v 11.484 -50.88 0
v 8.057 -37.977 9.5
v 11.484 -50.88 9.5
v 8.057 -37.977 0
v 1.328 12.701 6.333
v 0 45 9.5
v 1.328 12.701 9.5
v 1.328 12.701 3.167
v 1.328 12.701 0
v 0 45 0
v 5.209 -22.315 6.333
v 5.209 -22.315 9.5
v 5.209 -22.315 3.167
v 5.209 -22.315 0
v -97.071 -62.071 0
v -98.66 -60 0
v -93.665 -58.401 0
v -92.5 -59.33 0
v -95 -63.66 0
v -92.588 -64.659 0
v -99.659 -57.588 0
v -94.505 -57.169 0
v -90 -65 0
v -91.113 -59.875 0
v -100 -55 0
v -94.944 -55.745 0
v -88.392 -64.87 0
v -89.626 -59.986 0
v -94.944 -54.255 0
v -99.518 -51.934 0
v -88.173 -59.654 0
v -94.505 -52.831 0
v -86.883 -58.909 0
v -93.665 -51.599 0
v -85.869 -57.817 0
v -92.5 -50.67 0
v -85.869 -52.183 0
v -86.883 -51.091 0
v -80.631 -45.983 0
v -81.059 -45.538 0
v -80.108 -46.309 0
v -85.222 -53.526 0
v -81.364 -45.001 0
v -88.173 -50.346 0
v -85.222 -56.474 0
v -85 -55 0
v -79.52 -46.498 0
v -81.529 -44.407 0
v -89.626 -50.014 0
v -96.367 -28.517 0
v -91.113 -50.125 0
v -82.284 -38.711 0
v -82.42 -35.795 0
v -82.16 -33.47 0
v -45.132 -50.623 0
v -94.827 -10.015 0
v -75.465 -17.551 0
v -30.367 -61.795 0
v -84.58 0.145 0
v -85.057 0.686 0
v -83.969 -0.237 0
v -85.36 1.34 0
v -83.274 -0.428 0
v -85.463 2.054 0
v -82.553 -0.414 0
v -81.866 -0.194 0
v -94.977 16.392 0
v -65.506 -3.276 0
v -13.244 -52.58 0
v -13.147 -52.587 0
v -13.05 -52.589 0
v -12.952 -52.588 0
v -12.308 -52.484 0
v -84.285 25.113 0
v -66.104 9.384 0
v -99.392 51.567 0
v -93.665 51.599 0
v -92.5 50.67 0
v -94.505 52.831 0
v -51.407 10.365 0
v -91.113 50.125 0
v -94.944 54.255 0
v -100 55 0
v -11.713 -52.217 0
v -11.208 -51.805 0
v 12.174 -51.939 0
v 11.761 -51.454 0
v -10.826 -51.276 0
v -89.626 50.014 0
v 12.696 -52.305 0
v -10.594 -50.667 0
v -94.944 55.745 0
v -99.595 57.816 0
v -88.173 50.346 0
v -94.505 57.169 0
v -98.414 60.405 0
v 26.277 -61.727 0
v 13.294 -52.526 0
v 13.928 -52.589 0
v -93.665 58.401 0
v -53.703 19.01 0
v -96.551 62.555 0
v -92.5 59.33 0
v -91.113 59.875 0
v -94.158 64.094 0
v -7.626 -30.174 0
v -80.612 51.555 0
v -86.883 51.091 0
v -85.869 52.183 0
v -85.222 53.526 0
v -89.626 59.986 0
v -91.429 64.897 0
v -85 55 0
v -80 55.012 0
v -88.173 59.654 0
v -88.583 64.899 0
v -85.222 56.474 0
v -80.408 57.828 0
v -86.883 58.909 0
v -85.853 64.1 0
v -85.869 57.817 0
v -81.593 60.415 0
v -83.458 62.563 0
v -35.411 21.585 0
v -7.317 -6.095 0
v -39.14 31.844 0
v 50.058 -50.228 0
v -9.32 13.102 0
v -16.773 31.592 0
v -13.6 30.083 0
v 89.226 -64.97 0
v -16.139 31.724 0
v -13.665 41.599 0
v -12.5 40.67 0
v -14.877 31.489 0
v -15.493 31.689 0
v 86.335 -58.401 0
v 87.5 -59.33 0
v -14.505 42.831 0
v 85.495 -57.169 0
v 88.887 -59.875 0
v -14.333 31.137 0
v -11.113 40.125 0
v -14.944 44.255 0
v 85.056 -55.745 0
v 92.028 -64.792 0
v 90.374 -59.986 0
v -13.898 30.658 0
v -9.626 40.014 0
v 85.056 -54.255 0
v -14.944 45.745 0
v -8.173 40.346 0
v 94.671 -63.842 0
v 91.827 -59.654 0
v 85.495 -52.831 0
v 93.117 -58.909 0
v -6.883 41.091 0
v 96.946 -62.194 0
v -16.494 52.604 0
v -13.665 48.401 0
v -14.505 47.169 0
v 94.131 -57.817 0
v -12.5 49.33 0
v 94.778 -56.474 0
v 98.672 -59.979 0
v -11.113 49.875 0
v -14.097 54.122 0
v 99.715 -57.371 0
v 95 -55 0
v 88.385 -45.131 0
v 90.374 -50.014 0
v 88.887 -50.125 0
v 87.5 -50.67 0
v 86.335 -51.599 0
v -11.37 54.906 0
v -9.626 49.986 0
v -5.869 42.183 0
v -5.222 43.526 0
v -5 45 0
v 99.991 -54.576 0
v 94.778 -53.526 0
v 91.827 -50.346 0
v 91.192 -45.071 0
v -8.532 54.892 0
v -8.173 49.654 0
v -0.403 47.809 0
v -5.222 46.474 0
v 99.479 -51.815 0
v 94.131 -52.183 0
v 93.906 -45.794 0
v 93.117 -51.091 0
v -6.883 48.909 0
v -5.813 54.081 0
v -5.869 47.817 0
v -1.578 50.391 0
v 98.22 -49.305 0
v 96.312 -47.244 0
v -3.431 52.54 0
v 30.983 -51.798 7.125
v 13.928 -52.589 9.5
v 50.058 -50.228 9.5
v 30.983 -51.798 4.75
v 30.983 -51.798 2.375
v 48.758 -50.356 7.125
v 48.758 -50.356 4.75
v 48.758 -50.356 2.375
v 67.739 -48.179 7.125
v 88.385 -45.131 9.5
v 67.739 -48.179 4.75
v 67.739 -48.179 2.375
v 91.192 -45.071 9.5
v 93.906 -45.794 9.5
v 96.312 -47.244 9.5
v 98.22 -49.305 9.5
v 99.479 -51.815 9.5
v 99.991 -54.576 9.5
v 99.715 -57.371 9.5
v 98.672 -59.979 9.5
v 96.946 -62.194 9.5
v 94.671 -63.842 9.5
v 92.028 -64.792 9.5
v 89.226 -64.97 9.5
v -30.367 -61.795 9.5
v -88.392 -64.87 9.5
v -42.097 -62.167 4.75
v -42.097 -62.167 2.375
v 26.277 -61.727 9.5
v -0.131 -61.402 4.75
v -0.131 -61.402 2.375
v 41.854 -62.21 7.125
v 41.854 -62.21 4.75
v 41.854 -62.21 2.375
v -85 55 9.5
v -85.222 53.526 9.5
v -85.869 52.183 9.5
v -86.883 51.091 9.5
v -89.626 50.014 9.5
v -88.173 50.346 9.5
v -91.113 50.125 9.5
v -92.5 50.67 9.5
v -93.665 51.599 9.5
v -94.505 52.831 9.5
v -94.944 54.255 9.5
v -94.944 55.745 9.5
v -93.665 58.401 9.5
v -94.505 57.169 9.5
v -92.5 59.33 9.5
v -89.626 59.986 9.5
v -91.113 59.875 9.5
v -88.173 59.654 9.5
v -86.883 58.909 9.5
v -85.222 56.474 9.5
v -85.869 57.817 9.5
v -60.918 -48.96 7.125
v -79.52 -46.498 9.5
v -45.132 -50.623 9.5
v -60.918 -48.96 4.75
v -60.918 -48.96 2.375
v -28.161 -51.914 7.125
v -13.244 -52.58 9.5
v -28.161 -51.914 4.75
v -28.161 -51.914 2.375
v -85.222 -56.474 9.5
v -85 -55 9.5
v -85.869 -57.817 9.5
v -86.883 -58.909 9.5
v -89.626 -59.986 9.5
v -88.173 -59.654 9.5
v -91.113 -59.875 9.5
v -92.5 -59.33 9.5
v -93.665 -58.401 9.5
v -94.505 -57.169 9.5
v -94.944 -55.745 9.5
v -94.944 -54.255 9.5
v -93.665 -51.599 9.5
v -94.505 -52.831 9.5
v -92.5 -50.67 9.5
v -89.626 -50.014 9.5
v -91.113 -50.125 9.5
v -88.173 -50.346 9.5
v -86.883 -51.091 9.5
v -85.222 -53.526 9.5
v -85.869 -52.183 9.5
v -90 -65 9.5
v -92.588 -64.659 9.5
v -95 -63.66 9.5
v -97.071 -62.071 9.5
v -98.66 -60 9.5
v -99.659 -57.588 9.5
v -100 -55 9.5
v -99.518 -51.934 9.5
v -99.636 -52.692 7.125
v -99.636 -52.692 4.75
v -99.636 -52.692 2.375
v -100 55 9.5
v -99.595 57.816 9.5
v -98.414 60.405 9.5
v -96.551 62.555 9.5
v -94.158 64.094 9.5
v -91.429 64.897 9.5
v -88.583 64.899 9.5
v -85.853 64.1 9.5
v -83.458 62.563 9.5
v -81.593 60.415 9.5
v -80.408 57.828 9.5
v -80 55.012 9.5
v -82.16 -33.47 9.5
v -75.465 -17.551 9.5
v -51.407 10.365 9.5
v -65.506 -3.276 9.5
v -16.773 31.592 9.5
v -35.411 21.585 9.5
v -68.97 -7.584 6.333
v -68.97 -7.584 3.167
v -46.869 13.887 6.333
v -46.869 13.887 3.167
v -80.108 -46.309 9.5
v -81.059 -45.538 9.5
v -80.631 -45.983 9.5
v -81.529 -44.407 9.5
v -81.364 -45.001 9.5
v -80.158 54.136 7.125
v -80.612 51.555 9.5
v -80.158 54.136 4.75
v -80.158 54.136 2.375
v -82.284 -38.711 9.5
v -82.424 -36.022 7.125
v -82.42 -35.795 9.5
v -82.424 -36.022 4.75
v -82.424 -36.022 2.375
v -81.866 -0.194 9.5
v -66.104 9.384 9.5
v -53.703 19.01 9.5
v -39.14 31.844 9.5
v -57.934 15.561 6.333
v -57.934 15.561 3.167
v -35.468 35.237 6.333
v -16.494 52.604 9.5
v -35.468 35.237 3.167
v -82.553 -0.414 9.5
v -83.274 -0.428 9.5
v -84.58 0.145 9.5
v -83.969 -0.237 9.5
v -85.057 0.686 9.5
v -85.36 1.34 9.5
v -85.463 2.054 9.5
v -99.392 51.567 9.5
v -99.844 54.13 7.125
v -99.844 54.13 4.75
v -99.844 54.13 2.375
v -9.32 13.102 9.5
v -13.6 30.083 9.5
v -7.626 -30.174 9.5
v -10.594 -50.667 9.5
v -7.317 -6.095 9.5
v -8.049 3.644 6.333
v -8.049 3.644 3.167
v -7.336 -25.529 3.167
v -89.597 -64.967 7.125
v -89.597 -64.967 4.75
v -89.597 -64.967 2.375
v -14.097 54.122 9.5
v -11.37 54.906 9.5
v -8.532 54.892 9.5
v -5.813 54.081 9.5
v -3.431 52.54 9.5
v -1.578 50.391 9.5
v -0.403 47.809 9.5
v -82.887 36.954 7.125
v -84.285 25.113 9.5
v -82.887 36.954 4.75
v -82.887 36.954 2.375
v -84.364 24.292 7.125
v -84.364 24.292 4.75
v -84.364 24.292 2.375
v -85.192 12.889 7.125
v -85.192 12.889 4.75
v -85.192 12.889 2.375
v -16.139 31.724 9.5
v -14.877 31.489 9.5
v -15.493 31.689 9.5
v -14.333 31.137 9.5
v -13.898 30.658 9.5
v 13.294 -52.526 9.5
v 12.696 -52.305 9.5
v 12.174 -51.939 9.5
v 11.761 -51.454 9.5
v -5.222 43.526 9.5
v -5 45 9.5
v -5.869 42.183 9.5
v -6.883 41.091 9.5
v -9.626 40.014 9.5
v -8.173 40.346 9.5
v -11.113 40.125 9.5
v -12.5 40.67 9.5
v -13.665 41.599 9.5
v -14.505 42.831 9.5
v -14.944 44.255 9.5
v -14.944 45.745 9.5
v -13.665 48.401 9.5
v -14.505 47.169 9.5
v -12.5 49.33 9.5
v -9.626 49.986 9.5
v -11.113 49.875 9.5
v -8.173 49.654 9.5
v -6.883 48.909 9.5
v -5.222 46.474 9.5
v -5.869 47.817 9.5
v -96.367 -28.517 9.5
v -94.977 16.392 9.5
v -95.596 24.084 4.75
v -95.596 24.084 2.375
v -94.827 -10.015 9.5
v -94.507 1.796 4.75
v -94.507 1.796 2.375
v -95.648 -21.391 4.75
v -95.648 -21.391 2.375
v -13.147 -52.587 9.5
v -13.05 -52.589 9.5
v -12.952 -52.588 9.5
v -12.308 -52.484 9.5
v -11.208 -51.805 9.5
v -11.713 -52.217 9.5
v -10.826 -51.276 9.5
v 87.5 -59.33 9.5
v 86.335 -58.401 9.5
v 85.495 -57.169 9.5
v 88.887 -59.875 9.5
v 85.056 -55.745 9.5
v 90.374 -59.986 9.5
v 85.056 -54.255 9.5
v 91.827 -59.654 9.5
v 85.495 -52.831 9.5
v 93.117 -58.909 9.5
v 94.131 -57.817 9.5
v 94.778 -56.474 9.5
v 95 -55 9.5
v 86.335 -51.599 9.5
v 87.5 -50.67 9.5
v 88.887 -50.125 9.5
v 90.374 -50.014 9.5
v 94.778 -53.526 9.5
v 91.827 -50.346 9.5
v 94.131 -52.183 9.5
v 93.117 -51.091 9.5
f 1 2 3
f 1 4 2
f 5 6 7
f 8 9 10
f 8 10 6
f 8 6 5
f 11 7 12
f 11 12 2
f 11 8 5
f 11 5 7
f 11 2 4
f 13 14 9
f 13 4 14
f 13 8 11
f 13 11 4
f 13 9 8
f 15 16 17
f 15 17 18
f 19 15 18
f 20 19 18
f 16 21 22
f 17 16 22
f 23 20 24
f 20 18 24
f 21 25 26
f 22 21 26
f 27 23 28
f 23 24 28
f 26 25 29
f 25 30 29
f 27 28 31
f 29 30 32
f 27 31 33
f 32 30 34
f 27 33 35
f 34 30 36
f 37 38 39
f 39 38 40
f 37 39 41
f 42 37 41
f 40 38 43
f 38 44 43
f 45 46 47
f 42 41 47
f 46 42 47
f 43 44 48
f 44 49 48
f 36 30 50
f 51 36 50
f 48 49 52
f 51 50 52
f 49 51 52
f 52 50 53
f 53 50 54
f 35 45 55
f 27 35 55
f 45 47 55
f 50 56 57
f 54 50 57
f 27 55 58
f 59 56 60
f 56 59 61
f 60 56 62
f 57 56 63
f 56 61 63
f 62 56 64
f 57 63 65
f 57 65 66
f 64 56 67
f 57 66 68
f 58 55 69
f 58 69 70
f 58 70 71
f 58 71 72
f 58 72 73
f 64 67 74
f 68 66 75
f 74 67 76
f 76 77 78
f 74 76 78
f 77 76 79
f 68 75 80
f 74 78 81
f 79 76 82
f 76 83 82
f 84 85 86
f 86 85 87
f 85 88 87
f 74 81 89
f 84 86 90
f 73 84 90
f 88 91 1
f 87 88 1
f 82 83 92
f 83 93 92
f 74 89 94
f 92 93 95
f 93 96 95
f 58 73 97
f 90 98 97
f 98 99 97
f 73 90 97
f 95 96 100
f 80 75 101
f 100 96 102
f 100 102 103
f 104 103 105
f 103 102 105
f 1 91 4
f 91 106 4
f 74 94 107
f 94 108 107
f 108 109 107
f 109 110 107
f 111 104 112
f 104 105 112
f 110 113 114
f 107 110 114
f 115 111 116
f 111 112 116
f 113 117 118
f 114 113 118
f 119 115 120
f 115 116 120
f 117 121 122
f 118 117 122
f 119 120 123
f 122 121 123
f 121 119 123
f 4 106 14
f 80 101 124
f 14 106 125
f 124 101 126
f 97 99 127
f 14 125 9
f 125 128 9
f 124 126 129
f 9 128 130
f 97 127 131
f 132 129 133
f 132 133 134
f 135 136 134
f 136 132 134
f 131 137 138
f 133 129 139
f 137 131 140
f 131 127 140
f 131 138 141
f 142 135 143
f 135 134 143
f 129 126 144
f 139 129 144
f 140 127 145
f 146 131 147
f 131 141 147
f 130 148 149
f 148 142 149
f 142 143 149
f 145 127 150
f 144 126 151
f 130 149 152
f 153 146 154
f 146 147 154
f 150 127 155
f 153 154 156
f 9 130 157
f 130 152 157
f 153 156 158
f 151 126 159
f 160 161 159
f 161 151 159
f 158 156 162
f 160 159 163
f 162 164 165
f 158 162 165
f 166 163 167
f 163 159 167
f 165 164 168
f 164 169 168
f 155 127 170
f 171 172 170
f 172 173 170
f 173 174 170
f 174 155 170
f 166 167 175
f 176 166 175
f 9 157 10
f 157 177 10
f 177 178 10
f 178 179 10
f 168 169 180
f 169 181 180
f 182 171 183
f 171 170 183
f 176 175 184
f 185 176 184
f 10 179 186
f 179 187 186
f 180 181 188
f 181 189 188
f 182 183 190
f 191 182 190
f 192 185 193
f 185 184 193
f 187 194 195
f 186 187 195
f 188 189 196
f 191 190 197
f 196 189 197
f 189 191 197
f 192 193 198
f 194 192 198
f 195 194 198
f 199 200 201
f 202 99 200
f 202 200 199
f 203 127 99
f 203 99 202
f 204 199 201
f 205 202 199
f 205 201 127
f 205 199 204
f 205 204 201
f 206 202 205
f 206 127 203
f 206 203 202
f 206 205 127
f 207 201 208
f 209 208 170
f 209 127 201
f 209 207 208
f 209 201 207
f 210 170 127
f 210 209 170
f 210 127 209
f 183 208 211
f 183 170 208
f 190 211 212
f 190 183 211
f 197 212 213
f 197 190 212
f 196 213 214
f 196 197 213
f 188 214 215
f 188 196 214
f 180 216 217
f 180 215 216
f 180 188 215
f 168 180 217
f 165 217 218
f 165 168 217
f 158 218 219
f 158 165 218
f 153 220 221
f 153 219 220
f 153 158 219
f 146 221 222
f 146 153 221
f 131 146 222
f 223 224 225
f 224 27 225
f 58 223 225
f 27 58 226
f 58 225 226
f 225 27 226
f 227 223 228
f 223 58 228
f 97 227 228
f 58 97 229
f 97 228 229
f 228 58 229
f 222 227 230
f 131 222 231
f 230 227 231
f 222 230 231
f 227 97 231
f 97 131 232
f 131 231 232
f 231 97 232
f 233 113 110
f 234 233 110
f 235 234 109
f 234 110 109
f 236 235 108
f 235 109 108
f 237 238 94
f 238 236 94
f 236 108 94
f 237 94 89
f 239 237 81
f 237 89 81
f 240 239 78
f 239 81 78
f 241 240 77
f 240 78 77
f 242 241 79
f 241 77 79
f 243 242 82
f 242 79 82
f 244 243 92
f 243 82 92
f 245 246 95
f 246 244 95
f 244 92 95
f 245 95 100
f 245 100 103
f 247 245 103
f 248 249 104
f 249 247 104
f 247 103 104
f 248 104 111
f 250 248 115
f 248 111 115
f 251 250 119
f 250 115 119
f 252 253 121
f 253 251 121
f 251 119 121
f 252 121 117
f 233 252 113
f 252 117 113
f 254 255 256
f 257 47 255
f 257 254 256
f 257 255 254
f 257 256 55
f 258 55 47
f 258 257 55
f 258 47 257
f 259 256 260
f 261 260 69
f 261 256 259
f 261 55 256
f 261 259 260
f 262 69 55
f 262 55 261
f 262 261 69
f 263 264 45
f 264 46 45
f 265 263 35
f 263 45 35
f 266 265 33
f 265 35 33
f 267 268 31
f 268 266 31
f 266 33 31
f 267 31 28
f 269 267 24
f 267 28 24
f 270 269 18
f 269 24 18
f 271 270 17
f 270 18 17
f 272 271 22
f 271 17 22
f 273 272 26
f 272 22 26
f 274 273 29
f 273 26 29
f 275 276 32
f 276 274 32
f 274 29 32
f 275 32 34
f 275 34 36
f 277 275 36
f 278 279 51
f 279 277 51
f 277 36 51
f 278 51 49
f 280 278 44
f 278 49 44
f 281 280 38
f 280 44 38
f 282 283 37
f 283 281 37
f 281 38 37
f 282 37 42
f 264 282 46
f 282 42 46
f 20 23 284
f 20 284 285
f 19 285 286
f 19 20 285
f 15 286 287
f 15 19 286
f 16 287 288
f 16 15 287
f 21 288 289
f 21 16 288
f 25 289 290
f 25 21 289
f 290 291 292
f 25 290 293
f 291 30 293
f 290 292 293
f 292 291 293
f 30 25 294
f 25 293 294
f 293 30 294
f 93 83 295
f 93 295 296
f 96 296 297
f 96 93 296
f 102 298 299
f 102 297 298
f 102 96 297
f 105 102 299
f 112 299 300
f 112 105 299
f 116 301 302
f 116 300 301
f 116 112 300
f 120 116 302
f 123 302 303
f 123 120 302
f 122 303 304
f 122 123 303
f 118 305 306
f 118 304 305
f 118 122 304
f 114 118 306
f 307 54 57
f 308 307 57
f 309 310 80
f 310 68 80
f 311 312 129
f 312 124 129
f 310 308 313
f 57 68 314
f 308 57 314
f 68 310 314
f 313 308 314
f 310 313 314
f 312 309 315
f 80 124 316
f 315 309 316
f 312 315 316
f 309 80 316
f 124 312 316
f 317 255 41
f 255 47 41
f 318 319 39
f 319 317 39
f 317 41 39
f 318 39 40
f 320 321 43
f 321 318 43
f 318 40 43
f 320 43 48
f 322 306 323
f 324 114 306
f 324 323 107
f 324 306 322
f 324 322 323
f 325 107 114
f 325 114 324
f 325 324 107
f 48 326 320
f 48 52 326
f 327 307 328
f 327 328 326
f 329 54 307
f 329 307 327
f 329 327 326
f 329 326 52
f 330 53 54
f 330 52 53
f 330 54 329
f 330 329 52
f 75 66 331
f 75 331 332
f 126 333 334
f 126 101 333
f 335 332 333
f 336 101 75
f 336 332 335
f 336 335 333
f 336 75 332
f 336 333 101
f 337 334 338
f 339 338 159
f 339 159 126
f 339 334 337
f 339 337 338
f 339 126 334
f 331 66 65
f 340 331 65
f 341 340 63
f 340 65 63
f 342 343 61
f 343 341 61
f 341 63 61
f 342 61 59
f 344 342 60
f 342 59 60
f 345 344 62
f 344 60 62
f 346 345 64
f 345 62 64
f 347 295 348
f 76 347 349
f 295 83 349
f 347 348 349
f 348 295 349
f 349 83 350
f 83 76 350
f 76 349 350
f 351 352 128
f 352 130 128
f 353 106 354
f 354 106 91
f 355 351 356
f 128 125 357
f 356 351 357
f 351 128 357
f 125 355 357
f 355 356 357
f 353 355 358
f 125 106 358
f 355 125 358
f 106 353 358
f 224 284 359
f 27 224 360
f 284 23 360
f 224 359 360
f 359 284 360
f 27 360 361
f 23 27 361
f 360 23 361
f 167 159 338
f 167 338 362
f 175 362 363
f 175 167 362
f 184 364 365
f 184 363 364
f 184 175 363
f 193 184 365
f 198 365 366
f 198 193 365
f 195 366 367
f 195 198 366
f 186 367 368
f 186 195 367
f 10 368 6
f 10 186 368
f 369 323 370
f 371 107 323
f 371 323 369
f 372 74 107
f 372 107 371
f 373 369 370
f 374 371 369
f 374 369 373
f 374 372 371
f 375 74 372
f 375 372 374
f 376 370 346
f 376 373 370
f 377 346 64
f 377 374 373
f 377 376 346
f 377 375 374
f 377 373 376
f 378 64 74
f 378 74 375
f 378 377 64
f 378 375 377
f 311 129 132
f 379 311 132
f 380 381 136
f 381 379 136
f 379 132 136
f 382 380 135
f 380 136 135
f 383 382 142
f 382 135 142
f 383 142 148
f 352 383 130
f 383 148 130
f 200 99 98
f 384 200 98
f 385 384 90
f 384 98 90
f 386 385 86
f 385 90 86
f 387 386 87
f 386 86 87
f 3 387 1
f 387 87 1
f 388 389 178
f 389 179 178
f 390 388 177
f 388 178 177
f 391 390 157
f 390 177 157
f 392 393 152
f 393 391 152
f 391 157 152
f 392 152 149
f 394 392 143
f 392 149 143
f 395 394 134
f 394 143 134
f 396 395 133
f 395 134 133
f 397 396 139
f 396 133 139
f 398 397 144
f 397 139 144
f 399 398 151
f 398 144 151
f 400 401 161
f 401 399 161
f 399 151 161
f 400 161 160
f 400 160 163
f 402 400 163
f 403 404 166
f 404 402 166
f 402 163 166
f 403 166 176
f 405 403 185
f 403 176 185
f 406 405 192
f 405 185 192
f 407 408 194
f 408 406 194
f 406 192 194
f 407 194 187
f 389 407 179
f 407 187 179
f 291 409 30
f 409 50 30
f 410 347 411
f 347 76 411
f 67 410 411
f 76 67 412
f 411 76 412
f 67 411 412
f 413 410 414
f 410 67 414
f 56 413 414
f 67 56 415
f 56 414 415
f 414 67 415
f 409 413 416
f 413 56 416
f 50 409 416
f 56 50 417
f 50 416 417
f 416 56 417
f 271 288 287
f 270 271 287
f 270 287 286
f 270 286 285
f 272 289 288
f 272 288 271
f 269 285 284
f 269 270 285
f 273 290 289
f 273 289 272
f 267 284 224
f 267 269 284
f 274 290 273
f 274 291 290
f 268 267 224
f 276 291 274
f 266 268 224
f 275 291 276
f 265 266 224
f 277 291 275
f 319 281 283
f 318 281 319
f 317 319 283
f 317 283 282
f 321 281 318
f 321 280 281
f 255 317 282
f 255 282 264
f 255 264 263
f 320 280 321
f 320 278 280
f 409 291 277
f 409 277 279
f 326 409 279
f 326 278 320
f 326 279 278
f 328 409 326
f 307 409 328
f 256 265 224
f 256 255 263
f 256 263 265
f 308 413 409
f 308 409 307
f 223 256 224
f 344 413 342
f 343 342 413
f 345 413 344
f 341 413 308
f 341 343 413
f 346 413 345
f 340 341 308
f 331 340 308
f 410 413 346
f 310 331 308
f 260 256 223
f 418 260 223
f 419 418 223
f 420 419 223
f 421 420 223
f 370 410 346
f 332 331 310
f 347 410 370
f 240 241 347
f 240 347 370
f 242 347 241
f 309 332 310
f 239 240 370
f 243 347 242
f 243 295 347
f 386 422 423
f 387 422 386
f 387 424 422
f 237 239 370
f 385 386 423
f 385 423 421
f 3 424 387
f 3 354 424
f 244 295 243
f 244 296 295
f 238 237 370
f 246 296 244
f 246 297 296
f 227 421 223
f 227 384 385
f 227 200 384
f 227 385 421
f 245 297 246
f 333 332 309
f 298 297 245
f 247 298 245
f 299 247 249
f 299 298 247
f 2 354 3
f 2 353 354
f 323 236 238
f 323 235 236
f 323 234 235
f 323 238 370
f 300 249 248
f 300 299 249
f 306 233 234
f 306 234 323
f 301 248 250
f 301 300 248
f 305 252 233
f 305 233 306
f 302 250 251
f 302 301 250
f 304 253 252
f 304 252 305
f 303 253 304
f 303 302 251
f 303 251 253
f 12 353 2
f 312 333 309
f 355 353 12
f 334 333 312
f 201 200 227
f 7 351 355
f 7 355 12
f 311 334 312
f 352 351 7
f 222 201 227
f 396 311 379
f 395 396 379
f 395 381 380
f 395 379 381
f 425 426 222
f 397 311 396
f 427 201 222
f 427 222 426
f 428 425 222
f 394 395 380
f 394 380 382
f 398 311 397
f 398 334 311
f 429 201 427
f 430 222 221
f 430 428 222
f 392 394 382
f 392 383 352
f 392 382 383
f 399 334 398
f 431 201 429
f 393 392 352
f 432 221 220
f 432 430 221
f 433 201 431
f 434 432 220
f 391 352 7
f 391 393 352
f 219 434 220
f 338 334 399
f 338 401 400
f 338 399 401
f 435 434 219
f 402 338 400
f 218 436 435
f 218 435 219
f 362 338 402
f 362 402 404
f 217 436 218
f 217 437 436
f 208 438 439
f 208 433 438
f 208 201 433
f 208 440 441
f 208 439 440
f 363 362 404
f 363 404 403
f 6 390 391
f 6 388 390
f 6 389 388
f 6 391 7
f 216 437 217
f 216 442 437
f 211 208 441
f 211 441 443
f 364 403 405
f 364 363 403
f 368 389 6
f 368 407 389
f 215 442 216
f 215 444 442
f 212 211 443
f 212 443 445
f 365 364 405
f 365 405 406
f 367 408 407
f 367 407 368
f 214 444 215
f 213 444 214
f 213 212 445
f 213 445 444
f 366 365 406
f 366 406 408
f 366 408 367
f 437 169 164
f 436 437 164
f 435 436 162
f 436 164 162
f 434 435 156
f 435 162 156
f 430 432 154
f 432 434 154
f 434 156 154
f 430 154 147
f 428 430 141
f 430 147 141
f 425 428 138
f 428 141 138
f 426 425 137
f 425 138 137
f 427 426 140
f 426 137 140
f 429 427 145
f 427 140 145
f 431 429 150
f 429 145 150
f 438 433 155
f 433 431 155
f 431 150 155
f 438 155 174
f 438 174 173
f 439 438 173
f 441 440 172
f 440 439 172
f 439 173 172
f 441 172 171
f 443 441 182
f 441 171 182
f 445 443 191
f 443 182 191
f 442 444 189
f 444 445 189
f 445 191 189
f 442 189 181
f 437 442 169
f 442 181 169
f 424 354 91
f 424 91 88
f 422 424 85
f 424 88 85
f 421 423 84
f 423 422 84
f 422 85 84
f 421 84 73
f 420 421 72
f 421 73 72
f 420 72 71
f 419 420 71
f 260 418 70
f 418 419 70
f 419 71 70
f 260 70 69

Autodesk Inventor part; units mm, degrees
ref_plane "YZ Plane" through (0, 0, 0) normal (1, 0, 0) x (0, 1, 0)
ref_plane "XZ Plane" through (0, 0, 0) normal (0, 1, 0) x (-1, 0, 0)
ref_plane "XY Plane" through (0, 0, 0) normal (0, 0, 1) x (1, 0, 0)
sketch "Sketch1" plane through (0, 0, 0) normal (0, 0, 1) x (1, 0, 0)
  line L0 (-110, 70) -> (110, 70) construction
  line L1 (110, 70) -> (110, -70) construction
  line L2 (110, -70) -> (-110, -70) construction
  line L3 (-110, -70) -> (-110, 70) construction
  circle A0 centre (-90, 55) radius 5
  circle A1 centre (-90, -55) radius 5
  circle A2 centre (90, -55) radius 5
  circle A3 centre (-10, 45) radius 5
  line L4 (-67, 0) -> (-42, 0) construction
  line L5 (-42, 0) -> (-42, -30) construction
  line L6 (-42, -30) -> (-67, -30) construction
  line L7 (-67, -30) -> (-67, 0) construction
  circle A4 centre (-54.5, -11) radius 10 construction
  circle A5 centre (-63.5044, -24.4163) radius 3 construction
  circle A6 centre (-57.3559, -26.4695) radius 3 construction
  circle A7 centre (-51.263, -24.6531) radius 3 construction
  circle A8 centre (-45.3418, -26.5938) radius 3 construction
  arc A9 (-80.6122, 51.5548) -> (-99.3921, 51.5667) centre (-90, 55) ccw
  arc A10 (0, 45) -> (-16.4942, 52.6043) centre (-10, 45) ccw
  arc A11 (89.2256, -64.97) -> (88.3846, -45.1313) centre (90, -55) ccw
  line L8 (-100, 55) -> (-93.7227, 20.2343) construction
  line L9 (-93.7227, 20.2343) -> (-93.7227, 2.3339) construction
  line L10 (-93.7227, 2.3339) -> (-93.7227, -15.5707) construction
  line L11 (-93.7227, -15.5707) -> (-100, -55) construction
  spline S0 degree 4 poles (-100, 55) (-93.7227, 20.2343) (-93.7227, 2.3339) (-93.7227, -15.5707) (-100, -55) knots 1 1 1 1 1 2 2 2 2 2
  line L12 (-80, 55.0121) -> (-83.1179, 37.7603) construction
  line L13 (-33.0458, 38.469) -> (-16.4942, 52.6043) construction
  spline S1 degree 3 poles (-81.8662, -0.1941) (-57.8765, 11.5233) (-33.0458, 38.469) (-16.4942, 52.6043) knots 1.047287 1.047287 1.047287 1.047287 2 2 2 2
  line L14 (66.7614, -48.6708) -> (88.3846, -45.1313) construction
  line L15 (-90, -65) -> (-39.6885, -60.8902) construction
  line L16 (-39.6885, -60.8902) -> (0, -60.8902) construction
  line L17 (0, -60.8902) -> (36.6975, -60.8902) construction
  line L18 (36.6975, -60.8902) -> (89.2256, -64.97) construction
  spline S2 degree 4 poles (-90, -65) (-39.6885, -60.8902) (0, -60.8902) (36.6975, -60.8902) (89.2256, -64.97) knots 1 1 1 1 1 2 2 2 2 2
  spline S3 degree 3 poles (-13.6002, 30.0827) (-5.3402, 7.268) (-5.6398, -29.8026) (-10.5938, -50.667) knots 1.109736 1.109736 1.109736 1.109736 1.972131 1.972131 1.972131 1.972131
  line L19 (0, 45) -> (0, 17.1156) construction
  spline S4 degree 3 poles (0, 45) (0, 17.1156) (4.0635, -28.5965) (11.4843, -50.8799) knots 1 1 1 1 1.973632 1.973632 1.973632 1.973632
  arc A12 (-99.5185, -51.9345) -> (-88.3922, -64.8699) centre (-90, -55) ccw
  spline S5 degree 3 poles (-82.1602, -33.4696) (-73.7302, -5.1617) (-50.5606, 15.5541) (-16.7734, 31.5924) knots 1.116691 1.116691 1.116691 1.116691 1.939936 1.939936 1.939936 1.939936
  line L20 (-82.1602, -33.4696) -> (-73.7302, -5.1617) construction
  spline S6 degree 4 poles (-80, 55.0121) (-83.1179, 37.7603) (-84.6762, 24.5857) (-85.4554, 13.4176) (-85.4634, 2.054) knots 1 1 1 1 1 1.500456 1.500456 1.500456 1.500456 1.500456
  spline S7 degree 4 poles (-82.1602, -33.4696) (-82.7141, -35.9408) (-82.3572, -38.6467) (-81.9633, -41.4647) (-81.5291, -44.4067) knots 1.850189 1.850189 1.850189 1.850189 1.850189 1.936877 1.936877 1.936877 1.936877 1.936877
  line L21 (-82.1602, -33.4696) -> (-82.7141, -35.9408) construction
  spline S8 degree 4 poles (-79.5204, -46.4981) (-59.8812, -49.3583) (-42.9543, -51.1251) (-27.6277, -52.1691) (-12.9522, -52.5883) knots 1.043038 1.043038 1.043038 1.043038 1.043038 1.405573 1.405573 1.405573 1.405573 1.405573
  spline S9 degree 4 poles (13.9278, -52.5889) (30.7931, -52.1056) (47.9331, -50.8127) (66.7614, -48.6708) (88.3846, -45.1313) knots 1.574481 1.574481 1.574481 1.574481 1.574481 2 2 2 2 2
  arc A13 (-13.6002, 30.0827) -> (-16.7734, 31.5924) centre (-15.9509, 29.2316) ccw
  line L22 (-73.7302, -5.1617) -> (-50.5606, 15.5541) construction
  line L23 (-50.5606, 15.5541) -> (-16.7734, 31.5924) construction
  line L24 (-13.6002, 30.0827) -> (-5.3402, 7.268) construction
  arc A14 (-13.2443, -52.5799) -> (-10.5938, -50.667) centre (-13.0262, -50.0894) ccw
  line L25 (-5.3402, 7.268) -> (-5.6398, -29.8026) construction
  line L26 (-5.6398, -29.8026) -> (-10.5938, -50.667) construction
  line L27 (-27.6277, -52.1691) -> (-12.9522, -52.5883) construction
  arc A15 (11.4843, -50.8799) -> (13.9278, -52.5889) centre (13.8562, -50.09) ccw
  line L28 (0, 17.1156) -> (4.0635, -28.5965) construction
  line L29 (4.0635, -28.5965) -> (11.4843, -50.8799) construction
  line L30 (13.9278, -52.5889) -> (30.7931, -52.1056) construction
  line L31 (30.7931, -52.1056) -> (47.9331, -50.8127) construction
  line L32 (47.9331, -50.8127) -> (66.7614, -48.6708) construction
  arc A16 (-81.5291, -44.4067) -> (-79.5204, -46.4981) centre (-79.0558, -44.0416) ccw
  line L33 (-82.7141, -35.9408) -> (-82.3572, -38.6467) construction
  line L34 (-82.3572, -38.6467) -> (-81.9633, -41.4647) construction
  line L35 (-81.9633, -41.4647) -> (-81.5291, -44.4067) construction
  line L36 (-79.5204, -46.4981) -> (-59.8812, -49.3583) construction
  line L37 (-59.8812, -49.3583) -> (-42.9543, -51.1251) construction
  line L38 (-42.9543, -51.1251) -> (-27.6277, -52.1691) construction
  arc A17 (-85.4634, 2.054) -> (-81.8662, -0.1941) centre (-82.9634, 2.0522) ccw
  line L39 (-83.1179, 37.7603) -> (-84.6762, 24.5857) construction
  line L40 (-84.6762, 24.5857) -> (-85.4554, 13.4176) construction
  line L41 (-85.4554, 13.4176) -> (-85.4634, 2.054) construction
  line L42 (-81.8662, -0.1941) -> (-57.8765, 11.5233) construction
  line L43 (-57.8765, 11.5233) -> (-33.0458, 38.469) construction
  point P0 (0, 0)
  dimension "d1" = 70
  dimension "d2" = 70
  dimension "d3" = 110
  dimension "d4" = 110
  dimension "d5" = 10
  dimension "d6" = 10
  dimension "d7" = 10
  dimension "d8" = 10
  dimension "d9" = 55
  dimension "d10" = 55
  dimension "d11" = 55
  dimension "d12" = 180
  dimension "d13" = 90
  dimension "d14" = 90
  dimension "d15" = 10
  dimension "d16" = 45
  dimension "d17" = 42
  dimension "d18" = 30
  dimension "d19" = 0
  dimension "d20" = 25
  dimension "d21" = 20
  dimension "d22" = 6
  dimension "d23" = 6
  dimension "d24" = 6
  dimension "d25" = 11
  dimension "d26" = 12.5
  dimension "d27" = 6
  dimension "d28" = 20
  dimension "d29" = 20
  dimension "d30" = 20
  dimension "d34" = 5
  dimension "d35" = 5
  dimension "d36" = 5
  dimension "d37" = 5
  dimension "d38" = 5
extrude "Extrusion2" add sketch "Sketch1" along normal blind 9.5 contours S6 A17 S1 A10 S4 A15 S9 A11 S2 A12 S0 A9
equation "\"d1\" = d2"
equation "\"d4\" = d3"
equation "\"d10\" = d9"
equation "\"d11\" = d9"
equation "\"d14\" = d13"
equation "\"d26\" = 0.5 * d20"
properties part number "Bracket Concept MK1"
